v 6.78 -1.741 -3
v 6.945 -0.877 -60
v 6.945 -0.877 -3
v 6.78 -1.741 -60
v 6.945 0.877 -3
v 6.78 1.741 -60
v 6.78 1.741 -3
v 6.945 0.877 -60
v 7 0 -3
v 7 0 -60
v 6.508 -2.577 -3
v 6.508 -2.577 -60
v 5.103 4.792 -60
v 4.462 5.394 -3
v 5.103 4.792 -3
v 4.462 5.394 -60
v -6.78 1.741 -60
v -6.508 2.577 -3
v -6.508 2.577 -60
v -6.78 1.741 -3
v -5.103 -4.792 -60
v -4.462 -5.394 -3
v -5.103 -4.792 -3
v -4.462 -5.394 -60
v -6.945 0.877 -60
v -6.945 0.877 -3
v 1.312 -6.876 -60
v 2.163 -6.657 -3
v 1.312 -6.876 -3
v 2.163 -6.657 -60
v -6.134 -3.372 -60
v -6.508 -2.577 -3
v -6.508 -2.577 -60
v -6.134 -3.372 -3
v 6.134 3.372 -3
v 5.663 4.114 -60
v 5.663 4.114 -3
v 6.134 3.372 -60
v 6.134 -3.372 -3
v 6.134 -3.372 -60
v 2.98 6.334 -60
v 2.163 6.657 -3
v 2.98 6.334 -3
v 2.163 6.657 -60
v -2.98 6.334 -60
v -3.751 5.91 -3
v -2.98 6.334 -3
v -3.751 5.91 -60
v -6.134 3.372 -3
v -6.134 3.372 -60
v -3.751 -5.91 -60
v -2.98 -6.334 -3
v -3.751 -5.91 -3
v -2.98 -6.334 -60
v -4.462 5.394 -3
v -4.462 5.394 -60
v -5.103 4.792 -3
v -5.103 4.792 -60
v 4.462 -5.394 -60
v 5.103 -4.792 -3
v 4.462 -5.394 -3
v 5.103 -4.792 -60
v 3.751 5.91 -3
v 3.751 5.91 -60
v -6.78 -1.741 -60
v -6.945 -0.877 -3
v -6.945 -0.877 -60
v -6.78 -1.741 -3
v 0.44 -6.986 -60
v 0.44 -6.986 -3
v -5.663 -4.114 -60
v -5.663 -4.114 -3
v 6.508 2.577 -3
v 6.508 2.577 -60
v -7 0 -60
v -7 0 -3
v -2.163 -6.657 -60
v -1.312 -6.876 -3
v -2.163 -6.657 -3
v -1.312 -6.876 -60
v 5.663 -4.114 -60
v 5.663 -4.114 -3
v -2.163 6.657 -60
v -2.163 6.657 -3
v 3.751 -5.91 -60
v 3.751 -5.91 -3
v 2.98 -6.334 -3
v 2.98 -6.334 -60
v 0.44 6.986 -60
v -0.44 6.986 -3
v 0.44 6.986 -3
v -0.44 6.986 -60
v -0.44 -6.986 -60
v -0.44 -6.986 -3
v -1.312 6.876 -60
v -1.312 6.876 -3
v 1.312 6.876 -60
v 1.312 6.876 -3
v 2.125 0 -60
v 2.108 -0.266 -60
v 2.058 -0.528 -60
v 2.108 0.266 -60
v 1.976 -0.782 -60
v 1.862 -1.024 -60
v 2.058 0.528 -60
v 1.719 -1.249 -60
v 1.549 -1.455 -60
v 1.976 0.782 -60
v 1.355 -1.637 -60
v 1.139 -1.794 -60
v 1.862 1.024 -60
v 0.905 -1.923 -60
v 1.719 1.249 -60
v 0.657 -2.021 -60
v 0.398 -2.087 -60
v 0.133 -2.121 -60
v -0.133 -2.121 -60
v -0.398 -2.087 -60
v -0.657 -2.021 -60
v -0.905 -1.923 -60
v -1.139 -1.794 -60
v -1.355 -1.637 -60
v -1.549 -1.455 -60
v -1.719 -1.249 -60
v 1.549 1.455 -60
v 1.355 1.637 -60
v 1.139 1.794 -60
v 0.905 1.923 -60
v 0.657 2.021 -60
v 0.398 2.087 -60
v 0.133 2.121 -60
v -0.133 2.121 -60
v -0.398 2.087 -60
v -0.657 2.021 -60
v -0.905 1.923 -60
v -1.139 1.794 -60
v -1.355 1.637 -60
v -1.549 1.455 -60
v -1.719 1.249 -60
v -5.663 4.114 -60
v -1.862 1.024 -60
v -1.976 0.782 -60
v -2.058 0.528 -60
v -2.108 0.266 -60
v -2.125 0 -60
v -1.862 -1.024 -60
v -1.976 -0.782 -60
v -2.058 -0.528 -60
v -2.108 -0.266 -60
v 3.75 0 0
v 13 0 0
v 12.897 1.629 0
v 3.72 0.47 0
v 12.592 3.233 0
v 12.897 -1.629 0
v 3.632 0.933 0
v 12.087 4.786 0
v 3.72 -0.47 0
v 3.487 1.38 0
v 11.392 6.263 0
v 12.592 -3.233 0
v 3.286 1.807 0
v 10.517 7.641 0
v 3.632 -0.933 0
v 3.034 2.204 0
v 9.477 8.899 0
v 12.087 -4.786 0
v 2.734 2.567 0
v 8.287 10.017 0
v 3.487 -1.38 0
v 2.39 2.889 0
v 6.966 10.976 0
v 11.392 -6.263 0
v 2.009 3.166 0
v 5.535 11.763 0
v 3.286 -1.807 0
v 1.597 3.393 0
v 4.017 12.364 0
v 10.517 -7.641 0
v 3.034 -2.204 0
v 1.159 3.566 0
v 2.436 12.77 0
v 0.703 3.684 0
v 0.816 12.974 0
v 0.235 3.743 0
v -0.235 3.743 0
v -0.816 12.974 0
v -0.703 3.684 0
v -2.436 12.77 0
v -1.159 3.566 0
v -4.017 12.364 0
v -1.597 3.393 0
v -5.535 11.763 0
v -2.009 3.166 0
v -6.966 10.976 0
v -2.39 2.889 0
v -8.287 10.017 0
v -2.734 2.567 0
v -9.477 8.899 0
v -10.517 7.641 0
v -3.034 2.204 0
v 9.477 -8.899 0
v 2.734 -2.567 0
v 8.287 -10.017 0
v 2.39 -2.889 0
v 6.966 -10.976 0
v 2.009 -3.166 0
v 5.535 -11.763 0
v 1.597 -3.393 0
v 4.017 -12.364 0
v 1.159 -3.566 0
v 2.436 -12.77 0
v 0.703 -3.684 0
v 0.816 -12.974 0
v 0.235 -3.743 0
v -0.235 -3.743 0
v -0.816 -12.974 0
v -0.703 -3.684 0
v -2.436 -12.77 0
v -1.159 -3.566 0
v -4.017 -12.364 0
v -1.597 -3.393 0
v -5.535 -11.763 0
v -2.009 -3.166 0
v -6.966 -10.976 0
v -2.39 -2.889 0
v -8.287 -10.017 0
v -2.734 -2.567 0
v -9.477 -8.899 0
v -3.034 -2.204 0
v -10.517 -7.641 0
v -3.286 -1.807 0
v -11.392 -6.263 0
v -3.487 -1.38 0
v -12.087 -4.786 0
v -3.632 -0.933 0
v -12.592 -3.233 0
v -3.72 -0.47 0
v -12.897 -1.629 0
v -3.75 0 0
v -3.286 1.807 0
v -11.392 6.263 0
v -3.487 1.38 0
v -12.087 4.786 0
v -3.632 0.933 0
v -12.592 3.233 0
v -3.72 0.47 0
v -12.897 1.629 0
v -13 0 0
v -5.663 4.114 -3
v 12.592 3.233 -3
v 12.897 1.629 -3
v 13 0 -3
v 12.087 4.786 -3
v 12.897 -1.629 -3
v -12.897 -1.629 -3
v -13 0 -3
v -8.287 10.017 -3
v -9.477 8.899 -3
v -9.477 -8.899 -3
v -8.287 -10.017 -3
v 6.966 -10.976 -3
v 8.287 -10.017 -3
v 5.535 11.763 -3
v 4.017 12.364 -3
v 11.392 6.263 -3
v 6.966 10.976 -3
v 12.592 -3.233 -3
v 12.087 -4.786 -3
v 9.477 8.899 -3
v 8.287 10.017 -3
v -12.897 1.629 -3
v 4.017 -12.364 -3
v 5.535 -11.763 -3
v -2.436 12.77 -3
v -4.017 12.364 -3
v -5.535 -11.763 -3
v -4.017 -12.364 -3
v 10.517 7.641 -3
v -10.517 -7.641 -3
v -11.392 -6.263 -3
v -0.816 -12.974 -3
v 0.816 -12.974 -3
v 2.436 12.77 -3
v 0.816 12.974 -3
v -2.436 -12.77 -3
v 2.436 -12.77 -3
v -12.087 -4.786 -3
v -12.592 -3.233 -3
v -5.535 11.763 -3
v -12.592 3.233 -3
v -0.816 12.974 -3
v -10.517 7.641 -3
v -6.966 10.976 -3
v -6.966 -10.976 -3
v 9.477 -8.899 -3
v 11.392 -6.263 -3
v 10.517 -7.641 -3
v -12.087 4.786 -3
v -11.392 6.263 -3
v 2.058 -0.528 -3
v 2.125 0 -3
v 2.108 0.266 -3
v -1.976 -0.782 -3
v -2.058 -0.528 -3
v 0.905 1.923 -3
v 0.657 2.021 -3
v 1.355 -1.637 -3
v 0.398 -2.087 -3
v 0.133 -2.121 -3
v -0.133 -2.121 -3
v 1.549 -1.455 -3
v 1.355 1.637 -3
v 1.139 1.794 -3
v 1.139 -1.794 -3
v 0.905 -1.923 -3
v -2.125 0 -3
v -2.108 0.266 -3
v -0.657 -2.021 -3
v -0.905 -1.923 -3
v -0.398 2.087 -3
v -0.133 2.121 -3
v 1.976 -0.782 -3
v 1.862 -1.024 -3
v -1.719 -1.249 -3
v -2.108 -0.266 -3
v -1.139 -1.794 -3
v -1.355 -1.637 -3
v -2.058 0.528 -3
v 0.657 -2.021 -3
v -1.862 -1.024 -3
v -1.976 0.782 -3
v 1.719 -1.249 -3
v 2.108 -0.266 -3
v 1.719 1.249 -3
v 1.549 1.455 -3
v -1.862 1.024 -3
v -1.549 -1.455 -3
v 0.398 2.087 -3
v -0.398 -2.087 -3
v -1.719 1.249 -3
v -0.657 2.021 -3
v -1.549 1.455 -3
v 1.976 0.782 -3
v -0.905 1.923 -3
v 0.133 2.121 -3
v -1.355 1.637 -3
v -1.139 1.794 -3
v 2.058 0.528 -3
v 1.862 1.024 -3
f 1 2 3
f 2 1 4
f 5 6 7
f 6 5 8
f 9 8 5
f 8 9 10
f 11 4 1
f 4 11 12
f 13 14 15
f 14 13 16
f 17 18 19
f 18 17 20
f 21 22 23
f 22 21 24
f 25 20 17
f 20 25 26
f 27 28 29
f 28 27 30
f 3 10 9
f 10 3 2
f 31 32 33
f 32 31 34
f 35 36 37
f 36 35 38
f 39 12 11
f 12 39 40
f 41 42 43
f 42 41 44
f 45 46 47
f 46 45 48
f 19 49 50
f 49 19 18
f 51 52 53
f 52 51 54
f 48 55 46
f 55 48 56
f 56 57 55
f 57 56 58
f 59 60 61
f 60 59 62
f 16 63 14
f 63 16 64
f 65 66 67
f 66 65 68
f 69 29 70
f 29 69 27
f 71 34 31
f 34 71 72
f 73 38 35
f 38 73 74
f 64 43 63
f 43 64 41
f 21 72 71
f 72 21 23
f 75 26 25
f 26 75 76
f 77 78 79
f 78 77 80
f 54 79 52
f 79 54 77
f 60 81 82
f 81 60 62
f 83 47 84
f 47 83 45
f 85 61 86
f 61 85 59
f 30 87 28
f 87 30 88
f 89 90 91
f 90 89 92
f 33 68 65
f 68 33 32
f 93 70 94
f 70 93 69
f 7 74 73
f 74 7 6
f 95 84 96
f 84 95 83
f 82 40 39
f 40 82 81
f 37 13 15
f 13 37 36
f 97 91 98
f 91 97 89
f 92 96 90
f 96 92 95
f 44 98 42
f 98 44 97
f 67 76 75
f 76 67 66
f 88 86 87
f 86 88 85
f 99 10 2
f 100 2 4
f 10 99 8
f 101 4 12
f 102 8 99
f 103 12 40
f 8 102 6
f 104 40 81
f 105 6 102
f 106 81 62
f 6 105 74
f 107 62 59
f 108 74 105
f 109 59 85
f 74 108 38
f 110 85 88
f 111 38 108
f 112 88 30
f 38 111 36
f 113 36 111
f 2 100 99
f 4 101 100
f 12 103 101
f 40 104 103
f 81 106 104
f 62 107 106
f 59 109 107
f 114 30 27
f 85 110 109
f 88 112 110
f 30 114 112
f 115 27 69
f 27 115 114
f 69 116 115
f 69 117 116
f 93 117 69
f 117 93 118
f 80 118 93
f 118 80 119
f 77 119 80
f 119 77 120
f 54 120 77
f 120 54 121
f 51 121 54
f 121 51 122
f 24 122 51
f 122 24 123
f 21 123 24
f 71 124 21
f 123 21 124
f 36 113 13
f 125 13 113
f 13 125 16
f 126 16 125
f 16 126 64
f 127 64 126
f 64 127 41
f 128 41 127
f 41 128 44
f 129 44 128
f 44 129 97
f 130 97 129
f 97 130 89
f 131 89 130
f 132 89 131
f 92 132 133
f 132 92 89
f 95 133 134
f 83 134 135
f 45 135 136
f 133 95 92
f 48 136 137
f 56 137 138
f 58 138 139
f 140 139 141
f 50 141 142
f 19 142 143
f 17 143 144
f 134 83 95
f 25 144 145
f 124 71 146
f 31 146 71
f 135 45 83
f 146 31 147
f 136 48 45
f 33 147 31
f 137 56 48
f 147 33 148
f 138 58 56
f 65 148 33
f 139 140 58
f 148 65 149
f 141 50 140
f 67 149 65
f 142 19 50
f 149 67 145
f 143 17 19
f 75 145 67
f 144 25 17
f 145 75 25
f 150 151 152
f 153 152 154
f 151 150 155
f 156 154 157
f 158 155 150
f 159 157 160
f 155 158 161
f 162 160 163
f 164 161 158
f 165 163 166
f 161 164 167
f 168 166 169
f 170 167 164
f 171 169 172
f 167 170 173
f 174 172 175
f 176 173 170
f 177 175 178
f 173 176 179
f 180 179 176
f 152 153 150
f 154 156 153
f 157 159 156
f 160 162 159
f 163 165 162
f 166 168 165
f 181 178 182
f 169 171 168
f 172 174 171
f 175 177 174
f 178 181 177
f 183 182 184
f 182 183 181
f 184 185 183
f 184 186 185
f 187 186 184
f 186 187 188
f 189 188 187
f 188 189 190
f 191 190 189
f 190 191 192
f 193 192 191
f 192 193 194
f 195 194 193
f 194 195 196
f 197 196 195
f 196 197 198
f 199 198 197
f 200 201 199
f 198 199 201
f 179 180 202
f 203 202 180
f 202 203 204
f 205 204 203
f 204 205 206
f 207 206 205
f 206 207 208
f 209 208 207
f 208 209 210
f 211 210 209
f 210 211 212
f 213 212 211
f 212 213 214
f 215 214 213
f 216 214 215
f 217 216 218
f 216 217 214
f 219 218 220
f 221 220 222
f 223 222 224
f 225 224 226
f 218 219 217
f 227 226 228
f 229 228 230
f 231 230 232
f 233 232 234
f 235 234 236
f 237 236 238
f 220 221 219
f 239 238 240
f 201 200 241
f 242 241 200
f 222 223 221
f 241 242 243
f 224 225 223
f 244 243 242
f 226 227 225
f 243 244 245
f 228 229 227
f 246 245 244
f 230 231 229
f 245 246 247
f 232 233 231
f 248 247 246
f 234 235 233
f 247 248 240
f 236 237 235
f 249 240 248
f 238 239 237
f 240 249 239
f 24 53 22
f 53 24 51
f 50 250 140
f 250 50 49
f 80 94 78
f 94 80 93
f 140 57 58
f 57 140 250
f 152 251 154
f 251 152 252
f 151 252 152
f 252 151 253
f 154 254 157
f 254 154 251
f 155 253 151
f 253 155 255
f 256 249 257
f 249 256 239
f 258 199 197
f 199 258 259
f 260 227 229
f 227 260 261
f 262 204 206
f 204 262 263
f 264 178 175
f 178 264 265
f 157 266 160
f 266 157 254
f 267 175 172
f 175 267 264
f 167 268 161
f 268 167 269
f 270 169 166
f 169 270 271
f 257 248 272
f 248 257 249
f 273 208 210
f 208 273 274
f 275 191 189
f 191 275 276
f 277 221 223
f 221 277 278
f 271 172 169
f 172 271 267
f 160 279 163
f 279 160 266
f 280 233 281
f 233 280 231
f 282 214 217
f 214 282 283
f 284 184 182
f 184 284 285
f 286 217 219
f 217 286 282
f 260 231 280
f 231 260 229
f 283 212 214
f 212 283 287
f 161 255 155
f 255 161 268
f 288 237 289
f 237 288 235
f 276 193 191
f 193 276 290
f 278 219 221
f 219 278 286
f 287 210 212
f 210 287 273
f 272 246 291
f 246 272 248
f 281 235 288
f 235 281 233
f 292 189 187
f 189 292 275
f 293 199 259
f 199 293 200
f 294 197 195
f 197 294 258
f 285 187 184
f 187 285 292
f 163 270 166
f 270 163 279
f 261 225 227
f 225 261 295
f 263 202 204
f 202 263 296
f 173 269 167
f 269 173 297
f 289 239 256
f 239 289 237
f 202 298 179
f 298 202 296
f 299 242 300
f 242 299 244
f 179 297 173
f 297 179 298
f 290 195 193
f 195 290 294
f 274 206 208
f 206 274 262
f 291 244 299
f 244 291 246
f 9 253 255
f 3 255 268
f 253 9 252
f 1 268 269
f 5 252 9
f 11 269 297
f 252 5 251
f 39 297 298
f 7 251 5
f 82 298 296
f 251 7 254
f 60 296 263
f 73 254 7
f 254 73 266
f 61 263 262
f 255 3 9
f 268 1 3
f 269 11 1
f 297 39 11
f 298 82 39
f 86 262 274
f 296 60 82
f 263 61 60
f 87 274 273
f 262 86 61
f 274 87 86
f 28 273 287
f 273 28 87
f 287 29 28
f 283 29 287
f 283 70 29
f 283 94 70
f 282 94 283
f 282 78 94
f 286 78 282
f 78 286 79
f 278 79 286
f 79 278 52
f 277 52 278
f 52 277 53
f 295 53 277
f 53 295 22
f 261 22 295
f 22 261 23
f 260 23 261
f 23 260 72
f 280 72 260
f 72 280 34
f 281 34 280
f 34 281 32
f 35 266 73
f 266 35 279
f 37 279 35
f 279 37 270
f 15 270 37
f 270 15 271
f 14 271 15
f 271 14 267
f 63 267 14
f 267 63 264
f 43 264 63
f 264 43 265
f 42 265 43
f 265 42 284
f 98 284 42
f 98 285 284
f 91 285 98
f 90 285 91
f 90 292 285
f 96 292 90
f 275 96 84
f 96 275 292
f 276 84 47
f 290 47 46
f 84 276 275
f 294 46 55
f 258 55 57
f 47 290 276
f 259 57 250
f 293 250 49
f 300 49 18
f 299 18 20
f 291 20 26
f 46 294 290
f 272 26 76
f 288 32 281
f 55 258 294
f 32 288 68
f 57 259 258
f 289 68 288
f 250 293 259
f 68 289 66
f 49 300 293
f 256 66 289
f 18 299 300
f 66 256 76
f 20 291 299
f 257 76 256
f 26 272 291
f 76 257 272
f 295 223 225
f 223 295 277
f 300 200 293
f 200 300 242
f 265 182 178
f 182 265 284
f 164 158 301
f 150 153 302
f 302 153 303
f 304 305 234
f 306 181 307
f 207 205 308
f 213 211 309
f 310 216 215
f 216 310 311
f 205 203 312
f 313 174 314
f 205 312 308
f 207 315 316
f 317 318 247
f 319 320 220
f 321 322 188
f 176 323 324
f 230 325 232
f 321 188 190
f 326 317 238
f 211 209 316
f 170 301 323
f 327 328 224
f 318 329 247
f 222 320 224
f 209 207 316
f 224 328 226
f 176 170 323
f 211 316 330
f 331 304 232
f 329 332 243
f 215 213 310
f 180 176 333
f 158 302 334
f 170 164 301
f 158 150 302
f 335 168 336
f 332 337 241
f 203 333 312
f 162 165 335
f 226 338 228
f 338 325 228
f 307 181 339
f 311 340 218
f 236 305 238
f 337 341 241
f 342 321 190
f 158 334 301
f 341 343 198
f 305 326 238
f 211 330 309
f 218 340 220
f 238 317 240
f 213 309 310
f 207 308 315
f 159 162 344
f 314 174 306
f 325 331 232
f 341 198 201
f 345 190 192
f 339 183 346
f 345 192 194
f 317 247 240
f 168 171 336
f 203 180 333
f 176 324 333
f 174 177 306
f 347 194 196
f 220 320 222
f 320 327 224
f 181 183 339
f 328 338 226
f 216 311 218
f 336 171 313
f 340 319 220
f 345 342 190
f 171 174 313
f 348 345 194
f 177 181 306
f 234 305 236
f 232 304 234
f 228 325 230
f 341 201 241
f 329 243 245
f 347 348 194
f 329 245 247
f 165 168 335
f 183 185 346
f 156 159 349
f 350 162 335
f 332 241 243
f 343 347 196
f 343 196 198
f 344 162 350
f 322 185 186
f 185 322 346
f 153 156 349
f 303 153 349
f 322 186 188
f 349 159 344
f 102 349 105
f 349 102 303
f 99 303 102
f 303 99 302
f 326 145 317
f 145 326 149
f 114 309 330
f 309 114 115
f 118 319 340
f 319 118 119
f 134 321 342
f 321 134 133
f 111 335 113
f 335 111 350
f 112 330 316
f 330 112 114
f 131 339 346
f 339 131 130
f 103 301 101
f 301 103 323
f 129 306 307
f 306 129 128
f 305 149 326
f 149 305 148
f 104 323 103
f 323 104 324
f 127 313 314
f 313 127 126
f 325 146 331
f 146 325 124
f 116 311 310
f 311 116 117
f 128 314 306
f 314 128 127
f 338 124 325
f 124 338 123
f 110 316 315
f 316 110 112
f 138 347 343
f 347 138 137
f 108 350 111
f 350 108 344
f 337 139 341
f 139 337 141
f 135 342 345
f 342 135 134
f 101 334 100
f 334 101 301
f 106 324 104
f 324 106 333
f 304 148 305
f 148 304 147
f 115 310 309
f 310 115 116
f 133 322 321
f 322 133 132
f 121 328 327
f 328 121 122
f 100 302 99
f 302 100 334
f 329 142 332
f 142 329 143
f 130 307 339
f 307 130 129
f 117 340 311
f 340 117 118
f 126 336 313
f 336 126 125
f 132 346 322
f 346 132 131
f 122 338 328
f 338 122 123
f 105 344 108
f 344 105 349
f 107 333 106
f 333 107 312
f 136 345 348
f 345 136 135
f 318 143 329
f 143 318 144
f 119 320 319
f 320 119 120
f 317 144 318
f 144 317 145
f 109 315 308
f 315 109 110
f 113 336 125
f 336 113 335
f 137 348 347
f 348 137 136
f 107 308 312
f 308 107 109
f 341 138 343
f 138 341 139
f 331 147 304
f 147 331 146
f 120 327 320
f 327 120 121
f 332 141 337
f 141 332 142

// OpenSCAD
$fn = 50;


difference() {
	union() {
		translate(v = [0, 0, -60.0000000000]) {
			cylinder(h = 60, r = 7.0000000000);
		}
		translate(v = [0, 0, -3.0000000000]) {
			cylinder(h = 3, r = 13.0000000000);
		}
	}
	union() {
		translate(v = [0, 0, 0]) {
			rotate(a = [0, 0, 0]) {
				difference() {
					union() {
						#translate(v = [0, 0, -60.0000000000]) {
							cylinder(h = 60, r = 2.0000000000);
						}
						#translate(v = [0, 0, -3]) {
							cylinder(h = 3, r1 = 2.1250000000, r2 = 3.7500000000);
						}
						#translate(v = [0, 0, -60.0000000000]) {
							cylinder(h = 60, r = 2.1250000000);
						}
						#translate(v = [0, 0, -60.0000000000]) {
							cylinder(h = 60, r = 2.0000000000);
						}
					}
					union();
				}
			}
		}
	}
}
